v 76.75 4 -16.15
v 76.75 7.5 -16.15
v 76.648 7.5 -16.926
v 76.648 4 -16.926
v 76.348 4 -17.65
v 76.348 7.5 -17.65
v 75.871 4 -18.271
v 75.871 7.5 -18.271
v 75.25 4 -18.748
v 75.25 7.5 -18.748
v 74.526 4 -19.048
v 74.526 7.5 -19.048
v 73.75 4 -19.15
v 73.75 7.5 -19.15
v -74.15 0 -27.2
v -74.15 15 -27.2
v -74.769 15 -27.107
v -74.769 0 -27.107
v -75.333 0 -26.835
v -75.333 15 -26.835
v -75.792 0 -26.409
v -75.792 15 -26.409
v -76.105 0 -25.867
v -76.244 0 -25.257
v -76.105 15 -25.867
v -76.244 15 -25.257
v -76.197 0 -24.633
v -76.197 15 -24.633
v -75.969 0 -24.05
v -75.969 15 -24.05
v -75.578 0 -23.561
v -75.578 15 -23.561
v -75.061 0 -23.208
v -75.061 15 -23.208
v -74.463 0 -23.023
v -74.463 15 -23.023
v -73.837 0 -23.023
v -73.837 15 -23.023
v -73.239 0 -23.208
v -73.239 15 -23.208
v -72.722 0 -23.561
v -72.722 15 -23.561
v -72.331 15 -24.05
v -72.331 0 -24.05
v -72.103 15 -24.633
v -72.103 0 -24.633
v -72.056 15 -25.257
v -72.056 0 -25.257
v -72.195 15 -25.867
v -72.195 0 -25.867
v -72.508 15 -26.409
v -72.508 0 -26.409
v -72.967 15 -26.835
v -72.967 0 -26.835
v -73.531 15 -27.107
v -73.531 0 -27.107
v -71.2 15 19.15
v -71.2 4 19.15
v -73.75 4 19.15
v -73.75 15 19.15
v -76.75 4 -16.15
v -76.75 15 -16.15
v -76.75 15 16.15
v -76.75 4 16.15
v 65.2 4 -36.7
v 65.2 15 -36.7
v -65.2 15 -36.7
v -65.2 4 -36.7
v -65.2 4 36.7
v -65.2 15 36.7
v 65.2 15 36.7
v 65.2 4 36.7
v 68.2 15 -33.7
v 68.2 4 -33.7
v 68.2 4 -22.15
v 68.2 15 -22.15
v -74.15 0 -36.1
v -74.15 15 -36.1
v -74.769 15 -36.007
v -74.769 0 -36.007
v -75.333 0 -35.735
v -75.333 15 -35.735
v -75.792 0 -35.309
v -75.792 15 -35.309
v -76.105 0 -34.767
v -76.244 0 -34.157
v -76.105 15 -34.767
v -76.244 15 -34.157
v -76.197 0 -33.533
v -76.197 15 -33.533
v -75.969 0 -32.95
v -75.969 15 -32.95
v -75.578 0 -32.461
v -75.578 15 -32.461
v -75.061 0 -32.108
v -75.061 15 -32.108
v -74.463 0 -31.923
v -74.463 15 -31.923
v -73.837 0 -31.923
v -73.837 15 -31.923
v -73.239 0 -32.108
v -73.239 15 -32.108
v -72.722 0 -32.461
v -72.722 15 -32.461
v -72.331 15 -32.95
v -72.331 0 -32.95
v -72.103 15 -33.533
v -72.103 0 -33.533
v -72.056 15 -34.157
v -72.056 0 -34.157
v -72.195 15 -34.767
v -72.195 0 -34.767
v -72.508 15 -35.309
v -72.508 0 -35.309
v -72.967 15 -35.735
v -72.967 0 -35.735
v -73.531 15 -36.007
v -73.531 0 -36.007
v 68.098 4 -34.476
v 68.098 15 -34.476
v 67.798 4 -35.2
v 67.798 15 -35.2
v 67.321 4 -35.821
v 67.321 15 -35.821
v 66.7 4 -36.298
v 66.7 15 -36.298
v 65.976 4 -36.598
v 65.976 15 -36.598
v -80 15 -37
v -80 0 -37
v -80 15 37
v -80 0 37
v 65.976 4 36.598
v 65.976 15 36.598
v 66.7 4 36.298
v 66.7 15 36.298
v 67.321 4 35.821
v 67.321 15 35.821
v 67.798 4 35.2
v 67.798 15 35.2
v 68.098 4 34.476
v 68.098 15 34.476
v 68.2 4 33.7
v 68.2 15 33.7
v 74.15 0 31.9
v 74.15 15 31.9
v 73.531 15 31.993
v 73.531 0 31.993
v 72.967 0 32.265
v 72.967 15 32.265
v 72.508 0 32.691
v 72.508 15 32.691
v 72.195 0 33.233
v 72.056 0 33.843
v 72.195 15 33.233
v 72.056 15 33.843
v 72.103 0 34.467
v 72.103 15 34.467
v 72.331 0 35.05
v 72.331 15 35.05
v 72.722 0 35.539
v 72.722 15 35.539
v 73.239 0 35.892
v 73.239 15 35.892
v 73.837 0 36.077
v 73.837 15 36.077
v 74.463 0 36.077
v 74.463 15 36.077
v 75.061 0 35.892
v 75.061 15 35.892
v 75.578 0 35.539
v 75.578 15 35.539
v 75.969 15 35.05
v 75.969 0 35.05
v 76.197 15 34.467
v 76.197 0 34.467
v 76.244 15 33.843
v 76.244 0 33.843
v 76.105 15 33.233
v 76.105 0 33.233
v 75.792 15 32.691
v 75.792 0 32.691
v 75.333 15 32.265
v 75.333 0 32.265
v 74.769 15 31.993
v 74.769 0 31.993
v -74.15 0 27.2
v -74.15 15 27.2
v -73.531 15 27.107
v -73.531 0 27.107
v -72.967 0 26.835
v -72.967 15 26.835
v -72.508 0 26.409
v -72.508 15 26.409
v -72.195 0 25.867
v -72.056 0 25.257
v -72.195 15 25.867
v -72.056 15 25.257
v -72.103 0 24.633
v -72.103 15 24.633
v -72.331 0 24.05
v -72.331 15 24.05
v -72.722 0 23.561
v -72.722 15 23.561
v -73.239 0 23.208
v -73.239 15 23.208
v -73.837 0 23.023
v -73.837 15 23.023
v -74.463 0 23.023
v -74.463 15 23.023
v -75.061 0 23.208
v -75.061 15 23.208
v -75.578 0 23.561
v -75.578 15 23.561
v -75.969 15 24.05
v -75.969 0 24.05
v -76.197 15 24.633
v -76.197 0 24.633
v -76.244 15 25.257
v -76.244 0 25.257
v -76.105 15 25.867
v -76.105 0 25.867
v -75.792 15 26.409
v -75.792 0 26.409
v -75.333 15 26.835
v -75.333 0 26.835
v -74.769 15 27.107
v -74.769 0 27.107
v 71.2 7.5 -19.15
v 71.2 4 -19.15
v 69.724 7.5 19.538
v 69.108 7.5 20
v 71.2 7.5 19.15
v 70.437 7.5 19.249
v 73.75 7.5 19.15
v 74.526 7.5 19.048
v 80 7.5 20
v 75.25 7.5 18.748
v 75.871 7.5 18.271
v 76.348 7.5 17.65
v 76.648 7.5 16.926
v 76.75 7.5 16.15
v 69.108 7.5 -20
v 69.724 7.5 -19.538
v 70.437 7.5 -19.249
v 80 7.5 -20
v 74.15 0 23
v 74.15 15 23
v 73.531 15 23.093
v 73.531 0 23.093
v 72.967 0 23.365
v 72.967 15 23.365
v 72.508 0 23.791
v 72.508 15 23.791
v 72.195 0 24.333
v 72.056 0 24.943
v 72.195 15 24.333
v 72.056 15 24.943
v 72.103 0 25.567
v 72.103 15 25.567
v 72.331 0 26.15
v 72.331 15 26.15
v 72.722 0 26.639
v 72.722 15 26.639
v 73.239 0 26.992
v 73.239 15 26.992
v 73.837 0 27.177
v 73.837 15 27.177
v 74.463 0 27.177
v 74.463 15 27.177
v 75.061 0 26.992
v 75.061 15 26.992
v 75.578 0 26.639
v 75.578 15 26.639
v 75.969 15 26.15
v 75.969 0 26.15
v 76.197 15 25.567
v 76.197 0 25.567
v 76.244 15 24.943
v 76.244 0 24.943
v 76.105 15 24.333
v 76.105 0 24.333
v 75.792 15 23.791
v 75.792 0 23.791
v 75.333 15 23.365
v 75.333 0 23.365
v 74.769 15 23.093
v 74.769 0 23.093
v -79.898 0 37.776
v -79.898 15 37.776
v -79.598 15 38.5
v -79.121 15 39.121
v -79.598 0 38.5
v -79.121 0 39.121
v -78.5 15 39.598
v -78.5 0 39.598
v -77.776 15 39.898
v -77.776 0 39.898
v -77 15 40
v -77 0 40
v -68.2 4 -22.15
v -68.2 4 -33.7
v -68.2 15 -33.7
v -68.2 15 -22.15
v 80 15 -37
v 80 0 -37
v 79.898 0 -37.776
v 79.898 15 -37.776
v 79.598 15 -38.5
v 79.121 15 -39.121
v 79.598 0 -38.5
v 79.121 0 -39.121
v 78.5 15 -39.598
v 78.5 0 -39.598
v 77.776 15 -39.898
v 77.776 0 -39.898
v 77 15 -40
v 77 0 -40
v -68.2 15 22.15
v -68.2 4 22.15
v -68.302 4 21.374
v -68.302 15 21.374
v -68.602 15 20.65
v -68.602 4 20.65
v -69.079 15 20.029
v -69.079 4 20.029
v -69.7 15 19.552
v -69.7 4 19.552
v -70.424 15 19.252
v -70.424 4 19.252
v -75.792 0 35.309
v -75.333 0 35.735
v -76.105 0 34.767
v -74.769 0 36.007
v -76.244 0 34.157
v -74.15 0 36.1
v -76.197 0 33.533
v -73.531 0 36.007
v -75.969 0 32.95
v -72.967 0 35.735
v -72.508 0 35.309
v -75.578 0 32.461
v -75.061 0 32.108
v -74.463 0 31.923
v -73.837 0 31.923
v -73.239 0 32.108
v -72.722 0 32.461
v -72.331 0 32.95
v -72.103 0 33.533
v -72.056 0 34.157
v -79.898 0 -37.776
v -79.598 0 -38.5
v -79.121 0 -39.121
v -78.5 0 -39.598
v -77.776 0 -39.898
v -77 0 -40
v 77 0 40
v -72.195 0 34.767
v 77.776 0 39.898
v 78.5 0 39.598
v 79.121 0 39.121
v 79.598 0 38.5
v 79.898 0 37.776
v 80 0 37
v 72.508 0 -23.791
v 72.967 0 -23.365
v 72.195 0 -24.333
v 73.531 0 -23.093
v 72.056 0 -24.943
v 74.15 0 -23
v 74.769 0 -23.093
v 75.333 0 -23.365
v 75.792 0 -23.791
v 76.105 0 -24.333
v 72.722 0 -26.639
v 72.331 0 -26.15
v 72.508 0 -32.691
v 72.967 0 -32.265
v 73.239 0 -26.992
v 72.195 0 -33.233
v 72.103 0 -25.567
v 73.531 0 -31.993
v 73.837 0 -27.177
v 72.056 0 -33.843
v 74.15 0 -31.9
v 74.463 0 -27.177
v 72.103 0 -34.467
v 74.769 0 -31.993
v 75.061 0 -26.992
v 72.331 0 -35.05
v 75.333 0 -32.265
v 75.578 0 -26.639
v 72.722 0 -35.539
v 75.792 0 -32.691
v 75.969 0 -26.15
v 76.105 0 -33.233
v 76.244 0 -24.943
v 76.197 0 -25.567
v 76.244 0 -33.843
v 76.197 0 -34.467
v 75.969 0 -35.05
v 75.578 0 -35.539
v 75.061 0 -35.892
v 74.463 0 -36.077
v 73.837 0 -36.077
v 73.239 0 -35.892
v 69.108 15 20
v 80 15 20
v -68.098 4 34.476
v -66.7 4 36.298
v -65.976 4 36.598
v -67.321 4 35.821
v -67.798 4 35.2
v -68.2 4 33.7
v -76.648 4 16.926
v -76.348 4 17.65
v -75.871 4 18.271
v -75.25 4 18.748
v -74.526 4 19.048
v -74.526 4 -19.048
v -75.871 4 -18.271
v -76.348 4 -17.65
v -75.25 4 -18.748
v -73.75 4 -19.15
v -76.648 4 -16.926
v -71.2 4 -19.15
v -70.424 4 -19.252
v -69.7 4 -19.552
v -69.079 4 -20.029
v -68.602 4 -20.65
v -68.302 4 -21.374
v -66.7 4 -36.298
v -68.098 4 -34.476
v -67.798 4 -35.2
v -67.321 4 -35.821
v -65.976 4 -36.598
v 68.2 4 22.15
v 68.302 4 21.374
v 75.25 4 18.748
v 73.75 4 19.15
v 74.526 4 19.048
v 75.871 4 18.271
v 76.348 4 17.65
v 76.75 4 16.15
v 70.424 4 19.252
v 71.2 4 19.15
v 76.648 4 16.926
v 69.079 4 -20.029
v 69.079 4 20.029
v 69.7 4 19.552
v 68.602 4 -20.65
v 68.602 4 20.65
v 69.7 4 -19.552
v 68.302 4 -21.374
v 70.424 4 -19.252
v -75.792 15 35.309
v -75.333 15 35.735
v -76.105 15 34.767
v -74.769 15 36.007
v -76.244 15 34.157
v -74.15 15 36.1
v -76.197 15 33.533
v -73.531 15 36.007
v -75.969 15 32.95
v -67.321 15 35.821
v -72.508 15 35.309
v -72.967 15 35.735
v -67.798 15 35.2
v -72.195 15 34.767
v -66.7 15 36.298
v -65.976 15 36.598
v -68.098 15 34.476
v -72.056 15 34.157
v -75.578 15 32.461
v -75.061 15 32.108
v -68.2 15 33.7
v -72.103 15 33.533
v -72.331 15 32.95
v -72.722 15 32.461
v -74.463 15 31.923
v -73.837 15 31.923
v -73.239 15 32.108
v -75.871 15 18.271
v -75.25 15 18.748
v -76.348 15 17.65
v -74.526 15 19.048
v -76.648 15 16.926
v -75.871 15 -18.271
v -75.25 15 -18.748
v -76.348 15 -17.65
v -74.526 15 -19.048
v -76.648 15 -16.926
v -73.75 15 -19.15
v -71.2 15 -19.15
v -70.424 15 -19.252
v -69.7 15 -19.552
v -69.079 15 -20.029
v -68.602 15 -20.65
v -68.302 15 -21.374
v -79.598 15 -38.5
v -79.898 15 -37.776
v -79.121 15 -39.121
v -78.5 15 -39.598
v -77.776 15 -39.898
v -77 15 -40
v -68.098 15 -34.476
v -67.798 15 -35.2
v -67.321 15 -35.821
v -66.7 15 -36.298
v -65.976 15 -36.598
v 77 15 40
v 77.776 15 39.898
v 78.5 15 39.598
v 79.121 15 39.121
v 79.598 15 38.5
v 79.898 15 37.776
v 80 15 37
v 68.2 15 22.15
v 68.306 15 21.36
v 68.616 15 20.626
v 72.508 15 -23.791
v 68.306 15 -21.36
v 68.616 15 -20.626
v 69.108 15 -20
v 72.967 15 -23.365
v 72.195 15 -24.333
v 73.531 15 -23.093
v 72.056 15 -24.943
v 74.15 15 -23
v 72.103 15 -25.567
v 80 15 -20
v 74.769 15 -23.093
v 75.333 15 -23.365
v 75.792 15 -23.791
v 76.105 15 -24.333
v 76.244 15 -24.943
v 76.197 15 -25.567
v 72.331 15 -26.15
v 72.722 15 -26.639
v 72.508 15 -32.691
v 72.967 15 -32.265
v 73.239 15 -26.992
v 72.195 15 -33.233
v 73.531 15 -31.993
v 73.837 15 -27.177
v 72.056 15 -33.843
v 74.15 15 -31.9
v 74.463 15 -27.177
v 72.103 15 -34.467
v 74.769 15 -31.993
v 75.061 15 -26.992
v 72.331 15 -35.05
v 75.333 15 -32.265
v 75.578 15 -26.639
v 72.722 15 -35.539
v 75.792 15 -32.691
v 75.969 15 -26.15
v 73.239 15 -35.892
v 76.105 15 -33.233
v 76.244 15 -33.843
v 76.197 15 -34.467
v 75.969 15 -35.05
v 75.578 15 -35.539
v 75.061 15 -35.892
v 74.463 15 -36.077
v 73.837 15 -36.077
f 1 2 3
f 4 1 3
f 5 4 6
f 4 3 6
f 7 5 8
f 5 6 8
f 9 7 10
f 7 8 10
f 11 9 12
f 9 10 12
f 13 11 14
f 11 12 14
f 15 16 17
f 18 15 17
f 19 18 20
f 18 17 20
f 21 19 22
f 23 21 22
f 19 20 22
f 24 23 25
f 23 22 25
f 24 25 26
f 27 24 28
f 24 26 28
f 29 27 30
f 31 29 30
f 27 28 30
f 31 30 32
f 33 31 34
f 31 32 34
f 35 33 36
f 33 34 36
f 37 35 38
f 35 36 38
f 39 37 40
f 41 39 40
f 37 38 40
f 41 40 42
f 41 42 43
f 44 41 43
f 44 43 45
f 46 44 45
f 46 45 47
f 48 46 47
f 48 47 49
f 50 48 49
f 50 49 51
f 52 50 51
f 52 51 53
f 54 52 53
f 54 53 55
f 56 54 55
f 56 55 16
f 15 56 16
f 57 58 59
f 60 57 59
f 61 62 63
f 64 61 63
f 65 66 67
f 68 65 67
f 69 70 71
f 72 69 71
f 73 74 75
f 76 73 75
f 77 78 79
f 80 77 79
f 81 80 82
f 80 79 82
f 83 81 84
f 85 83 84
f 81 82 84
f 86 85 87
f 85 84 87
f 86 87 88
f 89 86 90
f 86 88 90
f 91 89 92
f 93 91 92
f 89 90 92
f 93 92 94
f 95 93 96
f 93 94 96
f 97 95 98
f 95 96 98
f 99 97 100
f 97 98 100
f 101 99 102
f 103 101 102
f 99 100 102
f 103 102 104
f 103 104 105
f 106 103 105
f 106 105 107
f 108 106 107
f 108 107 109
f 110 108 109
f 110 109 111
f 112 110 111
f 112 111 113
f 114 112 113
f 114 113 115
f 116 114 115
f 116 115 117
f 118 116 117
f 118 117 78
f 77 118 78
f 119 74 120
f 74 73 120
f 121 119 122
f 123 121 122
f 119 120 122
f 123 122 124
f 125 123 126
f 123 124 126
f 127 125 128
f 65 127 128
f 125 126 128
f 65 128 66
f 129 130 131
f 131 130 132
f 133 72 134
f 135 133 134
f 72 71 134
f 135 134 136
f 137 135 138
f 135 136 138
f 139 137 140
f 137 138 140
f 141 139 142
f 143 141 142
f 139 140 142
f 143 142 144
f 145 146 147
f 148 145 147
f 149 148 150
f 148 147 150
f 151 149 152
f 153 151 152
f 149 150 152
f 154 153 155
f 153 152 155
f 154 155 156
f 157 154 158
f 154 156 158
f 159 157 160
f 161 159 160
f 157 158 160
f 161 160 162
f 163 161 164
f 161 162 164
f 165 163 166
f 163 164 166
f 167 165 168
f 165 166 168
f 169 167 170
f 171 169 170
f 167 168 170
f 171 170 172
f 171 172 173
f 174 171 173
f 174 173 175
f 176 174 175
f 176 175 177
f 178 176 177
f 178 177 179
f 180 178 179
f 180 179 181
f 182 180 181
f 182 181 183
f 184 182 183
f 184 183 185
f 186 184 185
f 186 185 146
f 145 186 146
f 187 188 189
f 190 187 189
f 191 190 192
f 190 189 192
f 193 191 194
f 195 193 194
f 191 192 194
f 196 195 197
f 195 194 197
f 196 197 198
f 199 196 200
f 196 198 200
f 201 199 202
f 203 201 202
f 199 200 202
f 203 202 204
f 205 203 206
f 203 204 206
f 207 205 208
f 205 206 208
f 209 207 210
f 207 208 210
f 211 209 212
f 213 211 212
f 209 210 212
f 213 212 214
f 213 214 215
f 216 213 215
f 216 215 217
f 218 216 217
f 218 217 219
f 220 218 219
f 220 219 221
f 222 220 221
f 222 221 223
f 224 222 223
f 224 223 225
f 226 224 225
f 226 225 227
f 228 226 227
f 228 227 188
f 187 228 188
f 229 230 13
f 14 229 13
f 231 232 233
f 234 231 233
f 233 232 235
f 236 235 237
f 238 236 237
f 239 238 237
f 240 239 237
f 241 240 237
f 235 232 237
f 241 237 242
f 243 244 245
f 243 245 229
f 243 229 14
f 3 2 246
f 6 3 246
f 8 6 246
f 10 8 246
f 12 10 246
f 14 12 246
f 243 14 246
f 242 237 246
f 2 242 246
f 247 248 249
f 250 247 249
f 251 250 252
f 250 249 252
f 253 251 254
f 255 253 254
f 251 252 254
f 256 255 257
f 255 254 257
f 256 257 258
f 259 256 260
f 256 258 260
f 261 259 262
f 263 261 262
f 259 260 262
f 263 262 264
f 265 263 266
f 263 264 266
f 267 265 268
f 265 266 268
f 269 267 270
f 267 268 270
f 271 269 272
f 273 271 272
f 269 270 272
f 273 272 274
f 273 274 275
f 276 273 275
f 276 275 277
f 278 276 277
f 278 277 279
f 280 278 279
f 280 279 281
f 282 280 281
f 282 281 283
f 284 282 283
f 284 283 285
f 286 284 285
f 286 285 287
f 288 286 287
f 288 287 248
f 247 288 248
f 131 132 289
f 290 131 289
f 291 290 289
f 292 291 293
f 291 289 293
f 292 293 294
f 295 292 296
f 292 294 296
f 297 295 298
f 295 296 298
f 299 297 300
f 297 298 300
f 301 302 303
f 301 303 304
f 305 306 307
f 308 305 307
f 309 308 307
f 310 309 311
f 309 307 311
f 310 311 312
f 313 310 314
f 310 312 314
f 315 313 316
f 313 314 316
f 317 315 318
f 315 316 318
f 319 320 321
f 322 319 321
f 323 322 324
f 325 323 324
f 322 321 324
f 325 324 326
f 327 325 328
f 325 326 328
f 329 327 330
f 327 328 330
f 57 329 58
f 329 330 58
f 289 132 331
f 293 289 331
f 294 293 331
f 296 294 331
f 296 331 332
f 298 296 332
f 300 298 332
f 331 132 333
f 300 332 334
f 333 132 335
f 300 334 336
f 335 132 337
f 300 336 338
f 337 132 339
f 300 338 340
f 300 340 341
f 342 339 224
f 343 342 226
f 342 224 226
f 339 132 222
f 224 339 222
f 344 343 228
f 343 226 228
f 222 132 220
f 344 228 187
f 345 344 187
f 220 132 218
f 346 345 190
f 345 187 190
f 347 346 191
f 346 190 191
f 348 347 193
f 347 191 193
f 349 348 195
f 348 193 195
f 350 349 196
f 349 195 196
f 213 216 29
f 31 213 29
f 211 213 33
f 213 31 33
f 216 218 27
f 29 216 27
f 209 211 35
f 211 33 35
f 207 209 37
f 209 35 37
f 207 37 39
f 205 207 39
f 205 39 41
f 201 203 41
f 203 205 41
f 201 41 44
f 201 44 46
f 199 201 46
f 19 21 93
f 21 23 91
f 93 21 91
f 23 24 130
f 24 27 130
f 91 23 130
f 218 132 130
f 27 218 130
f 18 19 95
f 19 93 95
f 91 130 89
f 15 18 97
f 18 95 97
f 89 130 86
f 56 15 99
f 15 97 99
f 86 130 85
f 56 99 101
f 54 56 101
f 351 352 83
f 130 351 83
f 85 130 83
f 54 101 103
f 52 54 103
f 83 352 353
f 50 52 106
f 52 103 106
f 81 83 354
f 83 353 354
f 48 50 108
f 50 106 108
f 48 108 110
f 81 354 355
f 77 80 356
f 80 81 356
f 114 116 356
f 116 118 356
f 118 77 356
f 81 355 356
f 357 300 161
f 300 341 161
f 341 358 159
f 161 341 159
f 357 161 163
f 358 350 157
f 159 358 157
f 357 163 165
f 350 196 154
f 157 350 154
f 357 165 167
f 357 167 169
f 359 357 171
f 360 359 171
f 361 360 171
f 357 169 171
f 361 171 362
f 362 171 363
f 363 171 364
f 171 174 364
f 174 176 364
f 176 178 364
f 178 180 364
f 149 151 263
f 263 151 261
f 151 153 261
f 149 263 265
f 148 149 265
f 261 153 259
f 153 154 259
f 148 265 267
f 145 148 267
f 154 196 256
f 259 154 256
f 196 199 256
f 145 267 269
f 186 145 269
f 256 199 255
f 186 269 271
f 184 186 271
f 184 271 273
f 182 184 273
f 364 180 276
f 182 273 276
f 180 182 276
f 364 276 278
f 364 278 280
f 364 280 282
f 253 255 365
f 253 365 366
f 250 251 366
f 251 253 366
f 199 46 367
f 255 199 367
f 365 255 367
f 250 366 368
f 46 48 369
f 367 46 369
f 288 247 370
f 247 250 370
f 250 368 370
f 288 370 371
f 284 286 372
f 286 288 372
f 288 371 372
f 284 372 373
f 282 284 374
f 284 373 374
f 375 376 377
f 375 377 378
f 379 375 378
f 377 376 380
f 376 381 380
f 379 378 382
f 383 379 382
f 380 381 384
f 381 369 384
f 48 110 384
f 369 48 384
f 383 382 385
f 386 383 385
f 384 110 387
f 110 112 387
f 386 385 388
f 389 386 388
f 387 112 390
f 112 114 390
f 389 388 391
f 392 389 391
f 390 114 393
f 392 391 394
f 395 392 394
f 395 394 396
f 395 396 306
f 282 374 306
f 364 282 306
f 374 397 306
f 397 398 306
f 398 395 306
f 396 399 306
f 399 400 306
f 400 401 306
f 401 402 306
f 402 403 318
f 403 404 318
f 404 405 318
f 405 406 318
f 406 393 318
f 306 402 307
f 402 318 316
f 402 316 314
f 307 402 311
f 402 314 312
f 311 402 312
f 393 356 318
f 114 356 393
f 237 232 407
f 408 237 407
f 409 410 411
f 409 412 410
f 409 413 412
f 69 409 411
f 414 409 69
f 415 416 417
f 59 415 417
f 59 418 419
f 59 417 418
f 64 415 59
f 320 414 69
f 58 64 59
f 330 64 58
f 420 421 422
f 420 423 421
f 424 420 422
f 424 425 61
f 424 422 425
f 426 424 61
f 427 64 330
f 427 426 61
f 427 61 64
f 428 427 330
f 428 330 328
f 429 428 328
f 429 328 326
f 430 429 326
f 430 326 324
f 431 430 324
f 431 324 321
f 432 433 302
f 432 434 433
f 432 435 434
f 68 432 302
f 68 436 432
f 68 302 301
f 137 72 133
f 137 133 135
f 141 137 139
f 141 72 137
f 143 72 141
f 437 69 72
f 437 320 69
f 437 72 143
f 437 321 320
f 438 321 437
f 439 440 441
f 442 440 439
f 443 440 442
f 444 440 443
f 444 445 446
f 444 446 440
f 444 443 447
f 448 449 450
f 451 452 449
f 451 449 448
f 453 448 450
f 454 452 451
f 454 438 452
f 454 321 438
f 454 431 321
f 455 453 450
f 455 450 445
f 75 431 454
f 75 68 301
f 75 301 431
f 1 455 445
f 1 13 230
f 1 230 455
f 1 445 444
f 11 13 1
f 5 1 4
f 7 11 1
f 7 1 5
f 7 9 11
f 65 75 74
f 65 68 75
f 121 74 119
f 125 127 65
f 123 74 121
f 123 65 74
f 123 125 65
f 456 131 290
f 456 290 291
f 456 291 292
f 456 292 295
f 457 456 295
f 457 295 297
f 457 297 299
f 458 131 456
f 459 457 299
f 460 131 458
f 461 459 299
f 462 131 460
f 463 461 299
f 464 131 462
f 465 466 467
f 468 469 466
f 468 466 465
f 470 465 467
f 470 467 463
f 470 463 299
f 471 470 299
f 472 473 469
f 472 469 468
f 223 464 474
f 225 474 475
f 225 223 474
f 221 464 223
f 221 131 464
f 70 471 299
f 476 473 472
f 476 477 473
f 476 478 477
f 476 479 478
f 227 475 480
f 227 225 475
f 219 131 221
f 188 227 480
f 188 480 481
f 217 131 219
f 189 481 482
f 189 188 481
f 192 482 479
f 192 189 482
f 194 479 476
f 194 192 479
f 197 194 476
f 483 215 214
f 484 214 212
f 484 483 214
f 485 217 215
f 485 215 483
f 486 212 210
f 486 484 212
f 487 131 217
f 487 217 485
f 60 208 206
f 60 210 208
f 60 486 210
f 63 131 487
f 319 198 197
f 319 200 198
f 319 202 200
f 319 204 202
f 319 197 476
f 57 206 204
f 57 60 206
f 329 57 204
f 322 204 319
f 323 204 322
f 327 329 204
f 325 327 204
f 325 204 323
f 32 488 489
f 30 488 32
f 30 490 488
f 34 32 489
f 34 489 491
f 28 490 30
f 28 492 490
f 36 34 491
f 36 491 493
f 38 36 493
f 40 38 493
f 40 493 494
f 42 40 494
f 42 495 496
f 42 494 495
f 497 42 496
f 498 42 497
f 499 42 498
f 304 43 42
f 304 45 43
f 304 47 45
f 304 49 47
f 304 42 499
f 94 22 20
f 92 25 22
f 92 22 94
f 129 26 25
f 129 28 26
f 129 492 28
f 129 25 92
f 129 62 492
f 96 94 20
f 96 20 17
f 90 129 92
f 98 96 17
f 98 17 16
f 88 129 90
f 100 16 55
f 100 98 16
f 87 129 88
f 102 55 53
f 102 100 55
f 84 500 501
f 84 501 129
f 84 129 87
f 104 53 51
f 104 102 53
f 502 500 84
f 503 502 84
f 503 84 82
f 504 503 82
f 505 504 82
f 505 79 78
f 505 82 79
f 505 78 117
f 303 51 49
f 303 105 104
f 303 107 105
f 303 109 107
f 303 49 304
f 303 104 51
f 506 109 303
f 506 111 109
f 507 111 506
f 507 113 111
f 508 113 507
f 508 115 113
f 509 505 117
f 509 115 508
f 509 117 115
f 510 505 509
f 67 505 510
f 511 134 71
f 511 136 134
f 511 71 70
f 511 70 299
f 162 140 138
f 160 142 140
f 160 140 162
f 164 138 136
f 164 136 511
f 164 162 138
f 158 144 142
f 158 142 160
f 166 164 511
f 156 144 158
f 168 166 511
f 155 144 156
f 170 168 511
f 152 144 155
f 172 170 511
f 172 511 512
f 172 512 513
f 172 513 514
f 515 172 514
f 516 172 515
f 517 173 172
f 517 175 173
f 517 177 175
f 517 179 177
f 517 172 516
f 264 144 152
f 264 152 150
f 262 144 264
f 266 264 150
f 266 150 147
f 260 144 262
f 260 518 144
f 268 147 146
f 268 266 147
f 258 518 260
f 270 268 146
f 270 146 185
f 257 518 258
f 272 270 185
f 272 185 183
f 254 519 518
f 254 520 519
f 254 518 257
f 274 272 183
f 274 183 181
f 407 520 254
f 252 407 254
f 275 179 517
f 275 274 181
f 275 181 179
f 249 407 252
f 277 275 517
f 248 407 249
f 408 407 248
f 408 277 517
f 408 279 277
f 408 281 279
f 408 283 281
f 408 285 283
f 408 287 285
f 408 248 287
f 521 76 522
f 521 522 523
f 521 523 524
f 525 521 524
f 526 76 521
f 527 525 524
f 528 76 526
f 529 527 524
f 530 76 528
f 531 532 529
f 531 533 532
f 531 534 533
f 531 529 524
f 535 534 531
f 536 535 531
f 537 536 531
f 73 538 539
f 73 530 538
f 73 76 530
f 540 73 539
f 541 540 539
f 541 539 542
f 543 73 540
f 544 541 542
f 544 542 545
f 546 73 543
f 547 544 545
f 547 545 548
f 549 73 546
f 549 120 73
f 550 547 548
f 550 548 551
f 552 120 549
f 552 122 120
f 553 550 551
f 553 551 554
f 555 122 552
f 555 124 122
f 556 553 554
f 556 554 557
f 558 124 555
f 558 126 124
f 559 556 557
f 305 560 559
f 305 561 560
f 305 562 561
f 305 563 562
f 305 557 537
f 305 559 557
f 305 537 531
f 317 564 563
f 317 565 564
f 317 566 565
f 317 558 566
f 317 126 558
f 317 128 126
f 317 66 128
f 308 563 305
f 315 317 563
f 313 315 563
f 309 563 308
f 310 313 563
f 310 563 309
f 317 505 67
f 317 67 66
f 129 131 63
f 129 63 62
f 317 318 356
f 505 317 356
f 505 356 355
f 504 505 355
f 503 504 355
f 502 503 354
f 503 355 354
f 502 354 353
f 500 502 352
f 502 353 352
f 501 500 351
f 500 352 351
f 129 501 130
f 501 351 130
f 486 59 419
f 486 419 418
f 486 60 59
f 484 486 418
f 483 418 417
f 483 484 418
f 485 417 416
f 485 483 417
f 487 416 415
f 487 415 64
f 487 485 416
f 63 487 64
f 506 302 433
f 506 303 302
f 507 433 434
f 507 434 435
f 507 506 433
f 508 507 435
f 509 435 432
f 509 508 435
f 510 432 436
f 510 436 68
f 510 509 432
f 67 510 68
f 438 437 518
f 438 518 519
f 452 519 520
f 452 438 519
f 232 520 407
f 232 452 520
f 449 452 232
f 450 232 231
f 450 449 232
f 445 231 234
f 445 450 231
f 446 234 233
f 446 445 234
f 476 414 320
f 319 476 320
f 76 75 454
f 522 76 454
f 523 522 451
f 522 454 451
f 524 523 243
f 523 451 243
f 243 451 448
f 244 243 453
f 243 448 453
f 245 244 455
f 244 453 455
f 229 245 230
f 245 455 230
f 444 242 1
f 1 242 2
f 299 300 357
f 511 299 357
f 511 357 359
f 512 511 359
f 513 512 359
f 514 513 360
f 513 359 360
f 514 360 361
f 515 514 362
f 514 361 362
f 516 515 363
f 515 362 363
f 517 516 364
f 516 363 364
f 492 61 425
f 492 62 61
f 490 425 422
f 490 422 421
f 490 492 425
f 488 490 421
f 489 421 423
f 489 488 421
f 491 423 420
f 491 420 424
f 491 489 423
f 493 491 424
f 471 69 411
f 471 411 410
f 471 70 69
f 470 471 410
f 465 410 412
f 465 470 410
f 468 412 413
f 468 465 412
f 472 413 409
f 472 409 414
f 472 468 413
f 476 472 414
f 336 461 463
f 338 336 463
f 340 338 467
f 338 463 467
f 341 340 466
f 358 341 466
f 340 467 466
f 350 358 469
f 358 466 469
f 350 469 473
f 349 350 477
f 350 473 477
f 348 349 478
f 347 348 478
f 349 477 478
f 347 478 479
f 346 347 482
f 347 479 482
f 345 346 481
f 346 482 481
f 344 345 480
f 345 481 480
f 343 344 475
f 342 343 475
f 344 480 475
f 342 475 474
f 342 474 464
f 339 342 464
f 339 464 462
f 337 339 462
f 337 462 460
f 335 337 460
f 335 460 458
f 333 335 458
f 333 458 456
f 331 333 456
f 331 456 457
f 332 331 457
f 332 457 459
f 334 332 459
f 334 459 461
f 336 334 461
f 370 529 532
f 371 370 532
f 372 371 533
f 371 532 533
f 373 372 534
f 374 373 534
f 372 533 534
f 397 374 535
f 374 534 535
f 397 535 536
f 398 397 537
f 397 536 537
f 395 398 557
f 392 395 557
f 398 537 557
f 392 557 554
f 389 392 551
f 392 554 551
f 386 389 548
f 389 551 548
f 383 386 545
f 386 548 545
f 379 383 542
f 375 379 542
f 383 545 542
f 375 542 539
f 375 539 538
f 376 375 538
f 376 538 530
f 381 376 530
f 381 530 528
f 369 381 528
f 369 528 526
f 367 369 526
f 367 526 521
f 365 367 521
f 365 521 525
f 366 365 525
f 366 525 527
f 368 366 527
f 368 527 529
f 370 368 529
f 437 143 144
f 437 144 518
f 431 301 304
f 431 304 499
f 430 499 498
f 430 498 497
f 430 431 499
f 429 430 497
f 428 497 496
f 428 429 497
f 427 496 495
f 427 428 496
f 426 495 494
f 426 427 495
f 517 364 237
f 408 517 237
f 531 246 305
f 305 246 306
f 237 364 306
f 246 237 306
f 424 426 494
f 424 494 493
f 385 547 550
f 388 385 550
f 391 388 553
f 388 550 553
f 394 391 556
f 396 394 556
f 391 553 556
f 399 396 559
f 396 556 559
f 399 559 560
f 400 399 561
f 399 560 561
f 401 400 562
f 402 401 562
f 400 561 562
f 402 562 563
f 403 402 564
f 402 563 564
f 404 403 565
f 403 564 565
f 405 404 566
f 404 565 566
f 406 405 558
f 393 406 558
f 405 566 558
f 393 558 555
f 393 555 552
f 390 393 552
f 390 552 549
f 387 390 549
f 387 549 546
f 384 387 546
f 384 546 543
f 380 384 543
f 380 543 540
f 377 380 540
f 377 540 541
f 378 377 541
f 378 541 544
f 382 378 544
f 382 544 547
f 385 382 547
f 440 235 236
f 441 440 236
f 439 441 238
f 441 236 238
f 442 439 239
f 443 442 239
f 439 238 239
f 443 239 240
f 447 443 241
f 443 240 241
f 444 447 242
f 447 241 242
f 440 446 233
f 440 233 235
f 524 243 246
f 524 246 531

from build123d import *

# Parameters (mm, degrees)
EXTRUDE_1_DEPTH     = 15
CUT_EXTRUDE_1_DEPTH = 11
EXTRUDE_2_DEPTH     = 11
SKETCH_4_R          = 2.1
CUT_EXTRUDE_2_DEPTH = 91.691785736
FILLET_1_R          = 3
CUT_EXTRUDE_3_REACH = 167.605
SKETCH_5_W          = 40
SKETCH_5_H          = 40


with BuildPart() as part:
    # Эскиз1 → Бобышка-Вытянуть1 (new body)
    with BuildSketch(Plane(origin=(0, 0, 0), x_dir=(1, 0, 0), z_dir=(0, 1, 0))):
        with BuildLine():
            Line((-77, -40), (77, -40))
            ThreePointArc((77, -40), (79.121320344, -39.121320344), (80, -37))
            Line((80, -37), (80, 37))
            ThreePointArc((80, 37), (79.121320344, 39.121320344), (77, 40))
            Line((77, 40), (-77, 40))
            ThreePointArc((-77, 40), (-79.121320344, 39.121320344), (-80, 37))
            Line((-80, 37), (-80, -37))
            ThreePointArc((-80, -37), (-79.121320344, -39.121320344), (-77, -40))
        make_face()
    extrude(amount=EXTRUDE_1_DEPTH)

    # Эскиз2 → Вырез-Вытянуть1 (cut)
    with BuildSketch(Plane(origin=(0, 15, 0), x_dir=(1, 0, 0), z_dir=(0, 1, 0))):
        with BuildLine():
            Line((-75.75, -36.7), (75.75, -36.7))
            ThreePointArc((75.75, -36.7), (76.457106781, -36.407106781), (76.75, -35.7))
            Line((76.75, -35.7), (76.75, 35.7))
            ThreePointArc((76.75, 35.7), (76.457106781, 36.407106781), (75.75, 36.7))
            Line((75.75, 36.7), (-75.75, 36.7))
            ThreePointArc((-75.75, 36.7), (-76.457106781, 36.407106781), (-76.75, 35.7))
            Line((-76.75, 35.7), (-76.75, -35.7))
            ThreePointArc((-76.75, -35.7), (-76.457106781, -36.407106781), (-75.75, -36.7))
        make_face()
    extrude(amount=-CUT_EXTRUDE_1_DEPTH, mode=Mode.SUBTRACT)

    # Эскиз3 → Бобышка-Вытянуть2 (add)
    with BuildSketch(Plane(origin=(0, 4, 0), x_dir=(1, 0, 0), z_dir=(0, 1, 0))):
        with BuildLine():
            Line((-76.75, -36.7), (-68.2, -36.7))
            Line((-68.2, -36.7), (-68.2, -22.15))
            ThreePointArc((-68.2, -22.15), (-69.078679656, -20.028679656), (-71.2, -19.15))
            Line((-71.2, -19.15), (-76.75, -19.15))
            Line((-76.75, -19.15), (-76.75, -36.7))
        make_face()
        with BuildLine():
            Line((-68.2, 36.7), (-68.2, 22.15))
            ThreePointArc((-68.2, 22.15), (-69.078679656, 20.028679656), (-71.2, 19.15))
            Line((-71.2, 19.15), (-76.75, 19.15))
            Line((-76.75, 19.15), (-76.75, 36.7))
            Line((-76.75, 36.7), (-68.2, 36.7))
        make_face()
        with BuildLine():
            Line((76.75, 36.7), (68.2, 36.7))
            Line((68.2, 36.7), (68.2, 22.15))
            ThreePointArc((68.2, 22.15), (69.078679656, 20.028679656), (71.2, 19.15))
            Line((71.2, 19.15), (76.75, 19.15))
            Line((76.75, 19.15), (76.75, 36.7))
        make_face()
        with BuildLine():
            Line((68.2, -36.7), (68.2, -22.15))
            ThreePointArc((68.2, -22.15), (69.078679656, -20.028679656), (71.2, -19.15))
            Line((71.2, -19.15), (76.75, -19.15))
            Line((76.75, -19.15), (76.75, -36.7))
            Line((76.75, -36.7), (68.2, -36.7))
        make_face()
    extrude(amount=EXTRUDE_2_DEPTH)

    # Эскиз4 → Вырез-Вытянуть2 (cut, through all)
    with BuildSketch(Plane(origin=(0, 15, 0), x_dir=(1, 0, 0), z_dir=(0, 1, 0))):
        with Locations(Location((-74.15, -34, 0), (0, 0, 270))):
            Circle(SKETCH_4_R)
        with Locations(Location((-74.15, 34, 0), (0, 0, 90))):
            Circle(SKETCH_4_R)
        with Locations(Location((74.15, 34, 0), (0, 0, 270))):
            Circle(SKETCH_4_R)
        with Locations(Location((74.15, -34, 0), (0, 0, 90))):
            Circle(SKETCH_4_R)
        with Locations(Location((-74.15, -25.1, 0), (0, 0, 270))):
            Circle(SKETCH_4_R)
        with Locations(Location((-74.15, 25.1, 0), (0, 0, 90))):
            Circle(SKETCH_4_R)
        with Locations(Location((74.15, 25.1, 0), (0, 0, 270))):
            Circle(SKETCH_4_R)
        with Locations(Location((74.15, -25.1, 0), (0, 0, 90))):
            Circle(SKETCH_4_R)
    extrude(amount=-CUT_EXTRUDE_2_DEPTH, mode=Mode.SUBTRACT)

    # Скругление1
    fillet_1_edges = [part.edges().sort_by_distance(p)[0] for p in [
        (76.75, 9.5, 19.15),
        (68.2, 9.5, 36.7),
        (-68.2, 9.5, 36.7),
        (-76.75, 9.5, 19.15),
        (-76.75, 9.5, -19.15),
        (-68.2, 9.5, -36.7),
        (68.2, 9.5, -36.7),
        (76.75, 9.5, -19.15),
    ]]
    fillet(fillet_1_edges, radius=FILLET_1_R)

    # Вырез-Вытянуть3: up to this face of the body (flat: up to its plane)
    cut_extrude_3_end = Plane(part.part.faces().sort_by_distance((68.2, 9.5, -27.925))[0])
    # Эскиз5 → Вырез-Вытянуть3 (cut, up to the picked face)
    with BuildSketch(Plane(origin=(80, 0, 0), x_dir=(0, 0, -1), z_dir=(1, 0, 0)), mode=Mode.PRIVATE) as cut_extrude_3_sk1:
        with Locations((0, 27.5)):
            Rectangle(SKETCH_5_W, SKETCH_5_H)
    cut_extrude_3_tool1 = split(extrude(cut_extrude_3_sk1.sketch, amount=-CUT_EXTRUDE_3_REACH, mode=Mode.PRIVATE), bisect_by=cut_extrude_3_end, keep=Keep.BOTH, mode=Mode.PRIVATE)
    add(cut_extrude_3_tool1.solids().sort_by(Axis((80, 27.5, 0), (-1, 0, 0)))[0], mode=Mode.SUBTRACT)


solid = part.part
